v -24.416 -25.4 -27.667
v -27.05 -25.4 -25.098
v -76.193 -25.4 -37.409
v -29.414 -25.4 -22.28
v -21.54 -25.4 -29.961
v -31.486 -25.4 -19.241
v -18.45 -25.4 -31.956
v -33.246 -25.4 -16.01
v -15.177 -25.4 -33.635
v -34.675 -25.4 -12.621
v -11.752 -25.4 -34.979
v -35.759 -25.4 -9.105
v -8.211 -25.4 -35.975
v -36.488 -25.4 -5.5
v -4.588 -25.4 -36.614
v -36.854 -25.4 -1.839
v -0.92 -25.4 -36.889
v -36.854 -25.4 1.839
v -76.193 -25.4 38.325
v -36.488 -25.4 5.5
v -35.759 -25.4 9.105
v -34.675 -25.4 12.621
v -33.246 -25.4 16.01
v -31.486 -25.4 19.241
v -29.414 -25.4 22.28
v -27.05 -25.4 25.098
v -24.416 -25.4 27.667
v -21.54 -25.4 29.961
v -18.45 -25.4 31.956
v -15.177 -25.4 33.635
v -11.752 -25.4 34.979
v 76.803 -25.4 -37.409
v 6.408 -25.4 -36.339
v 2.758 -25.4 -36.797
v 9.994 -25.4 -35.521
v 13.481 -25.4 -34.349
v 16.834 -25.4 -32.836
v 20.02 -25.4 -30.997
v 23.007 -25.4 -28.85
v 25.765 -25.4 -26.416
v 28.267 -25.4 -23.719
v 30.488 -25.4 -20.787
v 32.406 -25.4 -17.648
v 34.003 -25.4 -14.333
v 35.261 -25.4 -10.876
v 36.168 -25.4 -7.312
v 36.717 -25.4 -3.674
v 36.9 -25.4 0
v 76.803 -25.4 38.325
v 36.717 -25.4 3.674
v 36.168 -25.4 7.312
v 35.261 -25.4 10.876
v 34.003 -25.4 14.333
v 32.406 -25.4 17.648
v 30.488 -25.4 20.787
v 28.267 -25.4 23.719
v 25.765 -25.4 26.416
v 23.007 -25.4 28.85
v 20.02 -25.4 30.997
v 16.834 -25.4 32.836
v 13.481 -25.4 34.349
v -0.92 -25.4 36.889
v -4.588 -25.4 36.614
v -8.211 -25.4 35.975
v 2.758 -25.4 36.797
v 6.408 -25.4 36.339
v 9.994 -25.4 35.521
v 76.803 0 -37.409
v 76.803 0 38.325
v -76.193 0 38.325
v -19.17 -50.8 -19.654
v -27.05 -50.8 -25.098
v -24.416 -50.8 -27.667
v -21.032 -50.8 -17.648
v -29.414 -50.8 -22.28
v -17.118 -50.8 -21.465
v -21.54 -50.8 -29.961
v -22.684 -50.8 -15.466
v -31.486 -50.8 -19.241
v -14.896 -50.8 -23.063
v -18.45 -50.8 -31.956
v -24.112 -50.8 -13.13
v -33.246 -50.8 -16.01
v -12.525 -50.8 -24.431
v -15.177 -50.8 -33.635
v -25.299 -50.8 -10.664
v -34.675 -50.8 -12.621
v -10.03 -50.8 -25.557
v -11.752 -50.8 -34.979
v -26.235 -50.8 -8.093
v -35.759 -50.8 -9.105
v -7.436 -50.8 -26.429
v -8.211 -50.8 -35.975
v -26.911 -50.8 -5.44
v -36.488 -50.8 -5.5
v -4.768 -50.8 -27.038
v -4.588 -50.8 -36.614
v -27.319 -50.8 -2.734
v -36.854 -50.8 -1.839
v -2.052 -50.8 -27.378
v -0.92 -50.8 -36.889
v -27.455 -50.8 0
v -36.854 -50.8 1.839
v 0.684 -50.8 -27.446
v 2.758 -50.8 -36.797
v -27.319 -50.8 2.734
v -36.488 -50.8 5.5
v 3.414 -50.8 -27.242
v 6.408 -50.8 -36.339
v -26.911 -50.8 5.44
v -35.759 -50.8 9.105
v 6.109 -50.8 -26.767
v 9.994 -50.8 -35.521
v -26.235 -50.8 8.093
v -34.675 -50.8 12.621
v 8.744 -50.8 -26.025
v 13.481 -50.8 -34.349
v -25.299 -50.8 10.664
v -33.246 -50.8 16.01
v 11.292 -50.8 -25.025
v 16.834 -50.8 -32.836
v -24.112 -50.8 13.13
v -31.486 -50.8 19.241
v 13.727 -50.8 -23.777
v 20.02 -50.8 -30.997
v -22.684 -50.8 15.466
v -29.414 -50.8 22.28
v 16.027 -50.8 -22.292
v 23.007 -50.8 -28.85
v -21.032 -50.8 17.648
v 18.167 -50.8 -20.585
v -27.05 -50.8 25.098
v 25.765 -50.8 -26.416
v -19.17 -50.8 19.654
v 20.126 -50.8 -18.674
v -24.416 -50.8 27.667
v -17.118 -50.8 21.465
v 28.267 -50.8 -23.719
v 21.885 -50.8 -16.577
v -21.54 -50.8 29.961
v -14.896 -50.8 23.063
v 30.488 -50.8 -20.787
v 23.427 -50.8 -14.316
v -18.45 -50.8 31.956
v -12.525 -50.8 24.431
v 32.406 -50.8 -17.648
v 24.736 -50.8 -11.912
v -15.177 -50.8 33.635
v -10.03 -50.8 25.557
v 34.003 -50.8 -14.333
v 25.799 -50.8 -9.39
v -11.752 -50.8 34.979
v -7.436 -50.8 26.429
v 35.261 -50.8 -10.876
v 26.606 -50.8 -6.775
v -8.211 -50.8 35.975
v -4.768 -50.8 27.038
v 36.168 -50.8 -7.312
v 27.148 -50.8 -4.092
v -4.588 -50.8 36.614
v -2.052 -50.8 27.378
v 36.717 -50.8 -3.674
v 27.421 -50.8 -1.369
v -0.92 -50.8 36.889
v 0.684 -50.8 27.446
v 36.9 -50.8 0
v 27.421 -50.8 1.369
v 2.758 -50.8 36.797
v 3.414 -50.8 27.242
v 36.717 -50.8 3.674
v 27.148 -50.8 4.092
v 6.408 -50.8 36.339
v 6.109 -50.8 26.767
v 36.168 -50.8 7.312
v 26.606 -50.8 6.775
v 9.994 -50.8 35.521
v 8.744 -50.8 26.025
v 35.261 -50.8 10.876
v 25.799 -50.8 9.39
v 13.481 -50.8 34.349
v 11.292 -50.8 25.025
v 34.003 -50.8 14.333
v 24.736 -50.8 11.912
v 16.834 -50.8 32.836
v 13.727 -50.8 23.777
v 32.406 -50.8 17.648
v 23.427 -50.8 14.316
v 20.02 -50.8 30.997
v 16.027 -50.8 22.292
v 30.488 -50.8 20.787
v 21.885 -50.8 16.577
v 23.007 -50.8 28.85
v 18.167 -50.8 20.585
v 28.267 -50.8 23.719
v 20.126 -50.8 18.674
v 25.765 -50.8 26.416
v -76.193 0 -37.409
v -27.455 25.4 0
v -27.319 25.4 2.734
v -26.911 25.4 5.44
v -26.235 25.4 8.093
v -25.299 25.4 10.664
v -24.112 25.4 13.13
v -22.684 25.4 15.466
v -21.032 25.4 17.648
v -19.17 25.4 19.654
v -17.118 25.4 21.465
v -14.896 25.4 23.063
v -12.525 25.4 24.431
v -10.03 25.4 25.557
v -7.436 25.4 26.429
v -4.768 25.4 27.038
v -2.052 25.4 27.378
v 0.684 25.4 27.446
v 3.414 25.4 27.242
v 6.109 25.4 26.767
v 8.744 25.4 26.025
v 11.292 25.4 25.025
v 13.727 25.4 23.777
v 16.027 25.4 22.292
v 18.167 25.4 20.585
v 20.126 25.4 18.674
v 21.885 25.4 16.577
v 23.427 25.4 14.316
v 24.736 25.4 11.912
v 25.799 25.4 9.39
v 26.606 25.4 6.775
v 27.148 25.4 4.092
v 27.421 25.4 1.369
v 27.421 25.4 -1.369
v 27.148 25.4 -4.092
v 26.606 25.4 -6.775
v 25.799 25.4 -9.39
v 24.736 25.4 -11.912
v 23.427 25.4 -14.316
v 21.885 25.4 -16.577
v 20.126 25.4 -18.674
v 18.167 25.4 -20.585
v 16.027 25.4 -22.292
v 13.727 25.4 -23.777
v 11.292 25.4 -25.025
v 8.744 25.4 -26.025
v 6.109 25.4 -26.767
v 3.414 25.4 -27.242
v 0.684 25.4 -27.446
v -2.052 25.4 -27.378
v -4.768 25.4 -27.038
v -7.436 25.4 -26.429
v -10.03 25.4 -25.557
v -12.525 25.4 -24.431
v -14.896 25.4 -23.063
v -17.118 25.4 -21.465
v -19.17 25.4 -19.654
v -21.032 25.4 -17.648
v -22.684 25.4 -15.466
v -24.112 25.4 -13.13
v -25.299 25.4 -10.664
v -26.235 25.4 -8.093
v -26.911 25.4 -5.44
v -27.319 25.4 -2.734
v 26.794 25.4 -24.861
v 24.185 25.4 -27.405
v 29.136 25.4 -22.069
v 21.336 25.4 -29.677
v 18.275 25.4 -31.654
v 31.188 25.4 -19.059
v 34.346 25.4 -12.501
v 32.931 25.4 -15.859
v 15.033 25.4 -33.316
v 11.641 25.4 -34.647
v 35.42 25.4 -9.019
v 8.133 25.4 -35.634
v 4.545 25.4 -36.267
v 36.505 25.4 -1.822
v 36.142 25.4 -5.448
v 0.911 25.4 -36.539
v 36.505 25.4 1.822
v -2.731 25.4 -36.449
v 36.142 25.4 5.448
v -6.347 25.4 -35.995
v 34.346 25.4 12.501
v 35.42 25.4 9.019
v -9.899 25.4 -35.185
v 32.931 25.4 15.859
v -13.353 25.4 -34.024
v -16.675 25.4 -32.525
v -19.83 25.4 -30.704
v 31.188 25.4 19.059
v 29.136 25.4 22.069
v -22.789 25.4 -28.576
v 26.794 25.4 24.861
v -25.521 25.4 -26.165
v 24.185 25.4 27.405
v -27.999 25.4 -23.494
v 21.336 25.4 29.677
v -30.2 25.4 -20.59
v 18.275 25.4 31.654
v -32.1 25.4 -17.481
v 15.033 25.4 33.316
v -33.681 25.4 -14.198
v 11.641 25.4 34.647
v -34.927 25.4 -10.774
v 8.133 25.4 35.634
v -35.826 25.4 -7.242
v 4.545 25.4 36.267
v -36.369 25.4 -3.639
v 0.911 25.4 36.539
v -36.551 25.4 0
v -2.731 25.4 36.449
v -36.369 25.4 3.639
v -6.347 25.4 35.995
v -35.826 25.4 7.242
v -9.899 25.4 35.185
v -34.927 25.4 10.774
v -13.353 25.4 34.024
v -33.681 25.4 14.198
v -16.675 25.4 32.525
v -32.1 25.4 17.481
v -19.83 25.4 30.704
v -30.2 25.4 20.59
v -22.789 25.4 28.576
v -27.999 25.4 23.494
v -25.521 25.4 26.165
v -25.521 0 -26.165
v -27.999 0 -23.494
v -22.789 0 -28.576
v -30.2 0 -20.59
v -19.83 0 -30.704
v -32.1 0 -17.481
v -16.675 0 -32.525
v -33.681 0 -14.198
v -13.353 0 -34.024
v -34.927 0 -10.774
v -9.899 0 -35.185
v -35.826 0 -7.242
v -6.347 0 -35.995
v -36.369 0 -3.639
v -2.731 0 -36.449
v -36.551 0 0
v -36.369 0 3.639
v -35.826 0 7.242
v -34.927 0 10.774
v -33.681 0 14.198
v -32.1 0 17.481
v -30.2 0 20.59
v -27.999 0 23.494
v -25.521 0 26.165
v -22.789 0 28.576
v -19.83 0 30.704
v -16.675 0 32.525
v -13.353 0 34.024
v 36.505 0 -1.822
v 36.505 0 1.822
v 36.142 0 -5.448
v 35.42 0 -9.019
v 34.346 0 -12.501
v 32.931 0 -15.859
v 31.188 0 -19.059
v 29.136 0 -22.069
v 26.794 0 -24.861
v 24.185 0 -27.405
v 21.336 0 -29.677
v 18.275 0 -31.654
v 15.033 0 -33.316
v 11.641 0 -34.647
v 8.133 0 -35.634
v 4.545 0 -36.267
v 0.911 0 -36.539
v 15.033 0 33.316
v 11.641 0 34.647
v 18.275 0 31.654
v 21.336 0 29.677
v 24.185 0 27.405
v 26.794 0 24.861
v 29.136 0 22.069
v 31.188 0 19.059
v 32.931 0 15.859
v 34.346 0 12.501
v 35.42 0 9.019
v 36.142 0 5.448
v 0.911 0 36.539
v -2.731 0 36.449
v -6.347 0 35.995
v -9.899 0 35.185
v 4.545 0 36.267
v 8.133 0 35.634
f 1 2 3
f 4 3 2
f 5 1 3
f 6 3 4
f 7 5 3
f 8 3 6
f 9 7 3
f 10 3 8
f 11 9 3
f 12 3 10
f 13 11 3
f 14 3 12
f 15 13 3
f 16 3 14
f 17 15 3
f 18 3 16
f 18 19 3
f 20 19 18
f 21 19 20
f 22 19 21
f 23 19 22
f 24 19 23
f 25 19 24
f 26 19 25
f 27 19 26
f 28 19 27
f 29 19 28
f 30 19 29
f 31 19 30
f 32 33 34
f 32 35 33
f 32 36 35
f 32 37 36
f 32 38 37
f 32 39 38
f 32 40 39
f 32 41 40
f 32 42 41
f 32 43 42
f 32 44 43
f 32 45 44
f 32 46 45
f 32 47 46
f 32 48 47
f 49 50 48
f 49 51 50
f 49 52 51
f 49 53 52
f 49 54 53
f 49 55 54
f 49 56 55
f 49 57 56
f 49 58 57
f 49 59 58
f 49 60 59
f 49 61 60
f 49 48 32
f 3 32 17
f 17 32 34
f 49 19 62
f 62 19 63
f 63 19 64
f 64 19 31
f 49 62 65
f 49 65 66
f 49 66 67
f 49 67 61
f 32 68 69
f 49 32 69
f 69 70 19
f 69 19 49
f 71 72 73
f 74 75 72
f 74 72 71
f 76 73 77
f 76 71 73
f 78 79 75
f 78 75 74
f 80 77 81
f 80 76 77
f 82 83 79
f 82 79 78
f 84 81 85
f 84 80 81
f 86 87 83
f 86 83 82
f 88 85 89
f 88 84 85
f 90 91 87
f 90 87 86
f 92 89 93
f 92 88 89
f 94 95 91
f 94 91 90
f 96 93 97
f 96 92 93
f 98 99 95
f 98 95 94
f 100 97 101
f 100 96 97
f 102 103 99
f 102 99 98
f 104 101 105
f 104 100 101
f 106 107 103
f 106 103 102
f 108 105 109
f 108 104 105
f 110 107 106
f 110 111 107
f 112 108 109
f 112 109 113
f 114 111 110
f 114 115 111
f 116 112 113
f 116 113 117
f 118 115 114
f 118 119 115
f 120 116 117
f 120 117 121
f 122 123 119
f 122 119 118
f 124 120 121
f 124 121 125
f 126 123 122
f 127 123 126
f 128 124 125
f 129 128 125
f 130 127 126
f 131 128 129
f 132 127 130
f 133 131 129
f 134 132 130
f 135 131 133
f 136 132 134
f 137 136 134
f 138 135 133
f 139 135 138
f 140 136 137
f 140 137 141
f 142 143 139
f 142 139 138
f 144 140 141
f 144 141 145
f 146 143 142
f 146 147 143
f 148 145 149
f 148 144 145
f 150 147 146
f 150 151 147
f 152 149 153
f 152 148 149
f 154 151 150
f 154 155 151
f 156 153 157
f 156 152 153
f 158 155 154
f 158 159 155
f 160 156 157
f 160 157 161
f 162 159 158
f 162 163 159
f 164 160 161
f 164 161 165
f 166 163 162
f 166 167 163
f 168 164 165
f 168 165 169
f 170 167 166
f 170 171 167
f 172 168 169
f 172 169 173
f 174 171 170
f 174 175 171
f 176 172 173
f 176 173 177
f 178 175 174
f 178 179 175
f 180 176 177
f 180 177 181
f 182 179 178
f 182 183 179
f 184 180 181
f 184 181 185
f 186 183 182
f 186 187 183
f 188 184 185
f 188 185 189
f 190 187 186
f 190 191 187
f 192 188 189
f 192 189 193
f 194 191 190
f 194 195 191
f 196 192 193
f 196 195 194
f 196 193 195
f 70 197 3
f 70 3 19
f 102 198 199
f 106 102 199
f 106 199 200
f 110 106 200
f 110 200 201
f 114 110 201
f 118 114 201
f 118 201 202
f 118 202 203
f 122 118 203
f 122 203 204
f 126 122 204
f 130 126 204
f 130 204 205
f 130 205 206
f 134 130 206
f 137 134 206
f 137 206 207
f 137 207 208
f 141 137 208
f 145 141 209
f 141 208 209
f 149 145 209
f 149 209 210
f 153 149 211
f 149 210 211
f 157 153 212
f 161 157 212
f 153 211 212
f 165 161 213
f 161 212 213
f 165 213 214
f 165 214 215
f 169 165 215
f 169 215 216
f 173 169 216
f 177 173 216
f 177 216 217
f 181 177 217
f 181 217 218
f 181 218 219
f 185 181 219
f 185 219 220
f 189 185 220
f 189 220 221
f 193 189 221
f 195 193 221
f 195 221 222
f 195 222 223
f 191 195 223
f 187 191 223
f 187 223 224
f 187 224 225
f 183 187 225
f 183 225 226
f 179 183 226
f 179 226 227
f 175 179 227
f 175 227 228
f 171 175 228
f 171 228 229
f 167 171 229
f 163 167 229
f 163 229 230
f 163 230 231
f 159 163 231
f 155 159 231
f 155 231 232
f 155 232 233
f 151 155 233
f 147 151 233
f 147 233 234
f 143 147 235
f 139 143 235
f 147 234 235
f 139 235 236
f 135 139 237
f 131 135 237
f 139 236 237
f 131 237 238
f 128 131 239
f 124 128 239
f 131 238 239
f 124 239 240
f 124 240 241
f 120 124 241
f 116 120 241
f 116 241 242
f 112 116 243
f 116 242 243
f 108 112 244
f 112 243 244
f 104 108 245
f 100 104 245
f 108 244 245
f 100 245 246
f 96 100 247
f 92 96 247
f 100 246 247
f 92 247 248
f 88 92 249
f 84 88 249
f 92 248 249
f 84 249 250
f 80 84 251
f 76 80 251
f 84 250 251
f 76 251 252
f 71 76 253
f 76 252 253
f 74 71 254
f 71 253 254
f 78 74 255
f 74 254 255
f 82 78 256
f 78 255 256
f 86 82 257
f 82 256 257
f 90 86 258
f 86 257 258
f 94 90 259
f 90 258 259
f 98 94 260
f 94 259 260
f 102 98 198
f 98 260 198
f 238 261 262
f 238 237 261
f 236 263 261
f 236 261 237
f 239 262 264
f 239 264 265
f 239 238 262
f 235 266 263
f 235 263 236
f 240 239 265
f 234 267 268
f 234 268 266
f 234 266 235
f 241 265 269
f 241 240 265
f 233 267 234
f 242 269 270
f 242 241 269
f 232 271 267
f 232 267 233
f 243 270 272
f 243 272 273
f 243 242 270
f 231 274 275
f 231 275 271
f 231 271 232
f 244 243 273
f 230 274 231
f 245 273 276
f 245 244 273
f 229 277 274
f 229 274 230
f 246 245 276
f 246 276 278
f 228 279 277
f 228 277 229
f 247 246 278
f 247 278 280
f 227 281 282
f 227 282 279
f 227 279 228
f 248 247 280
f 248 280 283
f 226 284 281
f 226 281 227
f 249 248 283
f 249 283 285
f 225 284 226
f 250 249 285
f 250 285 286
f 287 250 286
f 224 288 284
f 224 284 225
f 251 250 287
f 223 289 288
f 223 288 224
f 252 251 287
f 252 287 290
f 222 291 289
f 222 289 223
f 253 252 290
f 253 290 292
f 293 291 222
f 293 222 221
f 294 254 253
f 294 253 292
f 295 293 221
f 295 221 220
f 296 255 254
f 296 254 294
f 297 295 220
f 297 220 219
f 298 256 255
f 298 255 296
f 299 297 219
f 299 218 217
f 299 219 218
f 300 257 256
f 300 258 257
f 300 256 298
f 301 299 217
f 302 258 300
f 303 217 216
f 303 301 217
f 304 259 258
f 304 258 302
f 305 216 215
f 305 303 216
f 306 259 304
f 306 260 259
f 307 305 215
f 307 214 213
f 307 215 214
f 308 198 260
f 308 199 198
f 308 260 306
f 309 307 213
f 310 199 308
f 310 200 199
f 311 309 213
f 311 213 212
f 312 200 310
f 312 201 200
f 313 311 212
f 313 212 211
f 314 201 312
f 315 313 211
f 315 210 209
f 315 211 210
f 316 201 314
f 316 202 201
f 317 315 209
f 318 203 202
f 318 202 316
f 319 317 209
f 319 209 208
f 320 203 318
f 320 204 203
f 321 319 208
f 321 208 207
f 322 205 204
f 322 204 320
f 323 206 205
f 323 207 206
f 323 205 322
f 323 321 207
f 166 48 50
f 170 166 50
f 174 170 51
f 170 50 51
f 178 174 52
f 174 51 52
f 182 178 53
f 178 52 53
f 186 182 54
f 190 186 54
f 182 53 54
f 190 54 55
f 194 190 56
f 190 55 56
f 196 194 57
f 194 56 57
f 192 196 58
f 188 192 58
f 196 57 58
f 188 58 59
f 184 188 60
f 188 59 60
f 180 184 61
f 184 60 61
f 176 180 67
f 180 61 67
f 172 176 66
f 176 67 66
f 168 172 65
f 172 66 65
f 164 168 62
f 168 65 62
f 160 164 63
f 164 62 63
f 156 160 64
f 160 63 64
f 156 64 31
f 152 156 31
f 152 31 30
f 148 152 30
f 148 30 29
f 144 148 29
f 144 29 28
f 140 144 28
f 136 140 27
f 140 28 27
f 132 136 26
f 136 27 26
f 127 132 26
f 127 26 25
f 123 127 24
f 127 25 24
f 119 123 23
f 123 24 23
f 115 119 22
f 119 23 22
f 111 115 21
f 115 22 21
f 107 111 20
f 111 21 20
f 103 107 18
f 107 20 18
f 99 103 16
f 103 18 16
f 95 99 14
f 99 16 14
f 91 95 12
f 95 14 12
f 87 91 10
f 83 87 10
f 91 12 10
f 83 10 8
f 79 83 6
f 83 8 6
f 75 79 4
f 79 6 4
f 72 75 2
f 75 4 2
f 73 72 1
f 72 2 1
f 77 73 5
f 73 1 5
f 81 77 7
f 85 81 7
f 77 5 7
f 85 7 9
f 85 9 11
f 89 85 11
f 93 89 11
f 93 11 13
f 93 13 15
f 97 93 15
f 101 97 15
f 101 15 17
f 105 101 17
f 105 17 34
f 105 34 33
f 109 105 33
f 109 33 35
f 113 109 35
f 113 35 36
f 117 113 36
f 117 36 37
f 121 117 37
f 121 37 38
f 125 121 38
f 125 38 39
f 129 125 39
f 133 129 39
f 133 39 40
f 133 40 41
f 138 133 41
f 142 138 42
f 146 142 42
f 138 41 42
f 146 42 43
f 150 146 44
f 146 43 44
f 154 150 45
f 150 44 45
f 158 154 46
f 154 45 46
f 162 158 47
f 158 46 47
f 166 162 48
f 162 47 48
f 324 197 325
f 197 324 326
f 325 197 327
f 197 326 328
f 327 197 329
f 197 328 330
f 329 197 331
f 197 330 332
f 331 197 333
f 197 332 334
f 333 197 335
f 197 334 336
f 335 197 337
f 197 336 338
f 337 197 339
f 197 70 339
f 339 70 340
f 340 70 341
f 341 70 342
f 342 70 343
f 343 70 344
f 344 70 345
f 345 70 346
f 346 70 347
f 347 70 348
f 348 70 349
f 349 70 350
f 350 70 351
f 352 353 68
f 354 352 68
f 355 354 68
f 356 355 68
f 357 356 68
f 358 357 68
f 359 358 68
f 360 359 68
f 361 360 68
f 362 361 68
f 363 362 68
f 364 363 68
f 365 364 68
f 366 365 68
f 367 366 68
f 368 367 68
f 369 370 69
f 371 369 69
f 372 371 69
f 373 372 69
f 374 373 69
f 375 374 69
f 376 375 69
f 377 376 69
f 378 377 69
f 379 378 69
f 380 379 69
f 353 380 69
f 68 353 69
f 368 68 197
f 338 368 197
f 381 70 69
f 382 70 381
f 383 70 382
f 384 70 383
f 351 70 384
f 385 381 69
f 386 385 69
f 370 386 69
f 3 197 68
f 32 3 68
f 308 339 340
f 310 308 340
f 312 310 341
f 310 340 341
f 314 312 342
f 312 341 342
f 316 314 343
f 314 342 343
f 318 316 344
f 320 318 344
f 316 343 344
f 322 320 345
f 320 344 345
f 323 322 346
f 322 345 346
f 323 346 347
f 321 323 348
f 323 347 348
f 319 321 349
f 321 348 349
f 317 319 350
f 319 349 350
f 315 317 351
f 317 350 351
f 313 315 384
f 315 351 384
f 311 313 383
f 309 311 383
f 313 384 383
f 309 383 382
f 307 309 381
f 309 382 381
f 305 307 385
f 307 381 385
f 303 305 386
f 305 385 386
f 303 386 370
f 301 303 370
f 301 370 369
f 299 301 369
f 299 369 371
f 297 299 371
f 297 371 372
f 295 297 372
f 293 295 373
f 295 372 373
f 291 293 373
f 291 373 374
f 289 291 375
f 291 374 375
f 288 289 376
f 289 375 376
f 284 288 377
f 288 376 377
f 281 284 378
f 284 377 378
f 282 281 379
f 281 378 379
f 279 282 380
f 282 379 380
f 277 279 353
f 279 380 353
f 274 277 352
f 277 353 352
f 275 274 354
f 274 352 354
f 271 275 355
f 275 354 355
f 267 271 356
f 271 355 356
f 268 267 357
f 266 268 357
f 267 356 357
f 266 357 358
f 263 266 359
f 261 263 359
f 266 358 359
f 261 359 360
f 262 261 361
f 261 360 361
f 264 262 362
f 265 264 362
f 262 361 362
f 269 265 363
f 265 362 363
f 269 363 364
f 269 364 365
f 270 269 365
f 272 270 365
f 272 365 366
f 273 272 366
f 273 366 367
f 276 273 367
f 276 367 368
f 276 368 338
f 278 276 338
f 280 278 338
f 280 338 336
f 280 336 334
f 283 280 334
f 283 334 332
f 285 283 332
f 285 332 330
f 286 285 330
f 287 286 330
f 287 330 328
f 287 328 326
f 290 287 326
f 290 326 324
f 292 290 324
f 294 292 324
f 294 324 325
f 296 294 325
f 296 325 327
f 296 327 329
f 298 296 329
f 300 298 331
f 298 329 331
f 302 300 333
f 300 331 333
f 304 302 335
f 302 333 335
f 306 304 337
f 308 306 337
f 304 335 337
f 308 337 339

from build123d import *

# Parameters (mm, degrees)
F0_W     = 152.99622
F0_H     = 75.73466
F1_DEPTH = 25.4
F2_R     = 36.900045
F3_DEPTH = 25.4
F4_R     = 36.550704
F5_DEPTH = 25.4
F6_R     = 25.934616
F7_DEPTH = 25.4
F8_R     = 27.454989
F9_DEPTH = 83.312


with BuildPart() as f1:
    # F0 (on Front) → F1 (new body)
    with BuildSketch(Plane.XZ):
        with Locations((0.305381, 0.458073)):
            Rectangle(F0_W, F0_H)
    extrude(amount=F1_DEPTH)

    # F2 (on face) → F3 (join)
    with BuildSketch(Plane.XZ.offset(25.4)):
        Circle(F2_R)
    extrude(amount=F3_DEPTH)

    # F4 (on face) → F5 (join)
    with BuildSketch(Plane(origin=(0, 0, 0), x_dir=(-1, 0, 0), z_dir=(0, 1, 0))):
        Circle(F4_R)
    extrude(amount=F5_DEPTH)

    # F6 (on face) → F7 (cut)
    with BuildSketch(Plane.XZ.offset(50.8)):
        Circle(F6_R)
    extrude(amount=-F7_DEPTH, mode=Mode.SUBTRACT)

    # F8 (on face) → F9 (cut)
    with BuildSketch(Plane(origin=(0, 25.4, 0), x_dir=(-1, 0, 0), z_dir=(0, 1, 0))):
        Circle(F8_R)
    extrude(amount=-F9_DEPTH, mode=Mode.SUBTRACT)


solid = f1.part
